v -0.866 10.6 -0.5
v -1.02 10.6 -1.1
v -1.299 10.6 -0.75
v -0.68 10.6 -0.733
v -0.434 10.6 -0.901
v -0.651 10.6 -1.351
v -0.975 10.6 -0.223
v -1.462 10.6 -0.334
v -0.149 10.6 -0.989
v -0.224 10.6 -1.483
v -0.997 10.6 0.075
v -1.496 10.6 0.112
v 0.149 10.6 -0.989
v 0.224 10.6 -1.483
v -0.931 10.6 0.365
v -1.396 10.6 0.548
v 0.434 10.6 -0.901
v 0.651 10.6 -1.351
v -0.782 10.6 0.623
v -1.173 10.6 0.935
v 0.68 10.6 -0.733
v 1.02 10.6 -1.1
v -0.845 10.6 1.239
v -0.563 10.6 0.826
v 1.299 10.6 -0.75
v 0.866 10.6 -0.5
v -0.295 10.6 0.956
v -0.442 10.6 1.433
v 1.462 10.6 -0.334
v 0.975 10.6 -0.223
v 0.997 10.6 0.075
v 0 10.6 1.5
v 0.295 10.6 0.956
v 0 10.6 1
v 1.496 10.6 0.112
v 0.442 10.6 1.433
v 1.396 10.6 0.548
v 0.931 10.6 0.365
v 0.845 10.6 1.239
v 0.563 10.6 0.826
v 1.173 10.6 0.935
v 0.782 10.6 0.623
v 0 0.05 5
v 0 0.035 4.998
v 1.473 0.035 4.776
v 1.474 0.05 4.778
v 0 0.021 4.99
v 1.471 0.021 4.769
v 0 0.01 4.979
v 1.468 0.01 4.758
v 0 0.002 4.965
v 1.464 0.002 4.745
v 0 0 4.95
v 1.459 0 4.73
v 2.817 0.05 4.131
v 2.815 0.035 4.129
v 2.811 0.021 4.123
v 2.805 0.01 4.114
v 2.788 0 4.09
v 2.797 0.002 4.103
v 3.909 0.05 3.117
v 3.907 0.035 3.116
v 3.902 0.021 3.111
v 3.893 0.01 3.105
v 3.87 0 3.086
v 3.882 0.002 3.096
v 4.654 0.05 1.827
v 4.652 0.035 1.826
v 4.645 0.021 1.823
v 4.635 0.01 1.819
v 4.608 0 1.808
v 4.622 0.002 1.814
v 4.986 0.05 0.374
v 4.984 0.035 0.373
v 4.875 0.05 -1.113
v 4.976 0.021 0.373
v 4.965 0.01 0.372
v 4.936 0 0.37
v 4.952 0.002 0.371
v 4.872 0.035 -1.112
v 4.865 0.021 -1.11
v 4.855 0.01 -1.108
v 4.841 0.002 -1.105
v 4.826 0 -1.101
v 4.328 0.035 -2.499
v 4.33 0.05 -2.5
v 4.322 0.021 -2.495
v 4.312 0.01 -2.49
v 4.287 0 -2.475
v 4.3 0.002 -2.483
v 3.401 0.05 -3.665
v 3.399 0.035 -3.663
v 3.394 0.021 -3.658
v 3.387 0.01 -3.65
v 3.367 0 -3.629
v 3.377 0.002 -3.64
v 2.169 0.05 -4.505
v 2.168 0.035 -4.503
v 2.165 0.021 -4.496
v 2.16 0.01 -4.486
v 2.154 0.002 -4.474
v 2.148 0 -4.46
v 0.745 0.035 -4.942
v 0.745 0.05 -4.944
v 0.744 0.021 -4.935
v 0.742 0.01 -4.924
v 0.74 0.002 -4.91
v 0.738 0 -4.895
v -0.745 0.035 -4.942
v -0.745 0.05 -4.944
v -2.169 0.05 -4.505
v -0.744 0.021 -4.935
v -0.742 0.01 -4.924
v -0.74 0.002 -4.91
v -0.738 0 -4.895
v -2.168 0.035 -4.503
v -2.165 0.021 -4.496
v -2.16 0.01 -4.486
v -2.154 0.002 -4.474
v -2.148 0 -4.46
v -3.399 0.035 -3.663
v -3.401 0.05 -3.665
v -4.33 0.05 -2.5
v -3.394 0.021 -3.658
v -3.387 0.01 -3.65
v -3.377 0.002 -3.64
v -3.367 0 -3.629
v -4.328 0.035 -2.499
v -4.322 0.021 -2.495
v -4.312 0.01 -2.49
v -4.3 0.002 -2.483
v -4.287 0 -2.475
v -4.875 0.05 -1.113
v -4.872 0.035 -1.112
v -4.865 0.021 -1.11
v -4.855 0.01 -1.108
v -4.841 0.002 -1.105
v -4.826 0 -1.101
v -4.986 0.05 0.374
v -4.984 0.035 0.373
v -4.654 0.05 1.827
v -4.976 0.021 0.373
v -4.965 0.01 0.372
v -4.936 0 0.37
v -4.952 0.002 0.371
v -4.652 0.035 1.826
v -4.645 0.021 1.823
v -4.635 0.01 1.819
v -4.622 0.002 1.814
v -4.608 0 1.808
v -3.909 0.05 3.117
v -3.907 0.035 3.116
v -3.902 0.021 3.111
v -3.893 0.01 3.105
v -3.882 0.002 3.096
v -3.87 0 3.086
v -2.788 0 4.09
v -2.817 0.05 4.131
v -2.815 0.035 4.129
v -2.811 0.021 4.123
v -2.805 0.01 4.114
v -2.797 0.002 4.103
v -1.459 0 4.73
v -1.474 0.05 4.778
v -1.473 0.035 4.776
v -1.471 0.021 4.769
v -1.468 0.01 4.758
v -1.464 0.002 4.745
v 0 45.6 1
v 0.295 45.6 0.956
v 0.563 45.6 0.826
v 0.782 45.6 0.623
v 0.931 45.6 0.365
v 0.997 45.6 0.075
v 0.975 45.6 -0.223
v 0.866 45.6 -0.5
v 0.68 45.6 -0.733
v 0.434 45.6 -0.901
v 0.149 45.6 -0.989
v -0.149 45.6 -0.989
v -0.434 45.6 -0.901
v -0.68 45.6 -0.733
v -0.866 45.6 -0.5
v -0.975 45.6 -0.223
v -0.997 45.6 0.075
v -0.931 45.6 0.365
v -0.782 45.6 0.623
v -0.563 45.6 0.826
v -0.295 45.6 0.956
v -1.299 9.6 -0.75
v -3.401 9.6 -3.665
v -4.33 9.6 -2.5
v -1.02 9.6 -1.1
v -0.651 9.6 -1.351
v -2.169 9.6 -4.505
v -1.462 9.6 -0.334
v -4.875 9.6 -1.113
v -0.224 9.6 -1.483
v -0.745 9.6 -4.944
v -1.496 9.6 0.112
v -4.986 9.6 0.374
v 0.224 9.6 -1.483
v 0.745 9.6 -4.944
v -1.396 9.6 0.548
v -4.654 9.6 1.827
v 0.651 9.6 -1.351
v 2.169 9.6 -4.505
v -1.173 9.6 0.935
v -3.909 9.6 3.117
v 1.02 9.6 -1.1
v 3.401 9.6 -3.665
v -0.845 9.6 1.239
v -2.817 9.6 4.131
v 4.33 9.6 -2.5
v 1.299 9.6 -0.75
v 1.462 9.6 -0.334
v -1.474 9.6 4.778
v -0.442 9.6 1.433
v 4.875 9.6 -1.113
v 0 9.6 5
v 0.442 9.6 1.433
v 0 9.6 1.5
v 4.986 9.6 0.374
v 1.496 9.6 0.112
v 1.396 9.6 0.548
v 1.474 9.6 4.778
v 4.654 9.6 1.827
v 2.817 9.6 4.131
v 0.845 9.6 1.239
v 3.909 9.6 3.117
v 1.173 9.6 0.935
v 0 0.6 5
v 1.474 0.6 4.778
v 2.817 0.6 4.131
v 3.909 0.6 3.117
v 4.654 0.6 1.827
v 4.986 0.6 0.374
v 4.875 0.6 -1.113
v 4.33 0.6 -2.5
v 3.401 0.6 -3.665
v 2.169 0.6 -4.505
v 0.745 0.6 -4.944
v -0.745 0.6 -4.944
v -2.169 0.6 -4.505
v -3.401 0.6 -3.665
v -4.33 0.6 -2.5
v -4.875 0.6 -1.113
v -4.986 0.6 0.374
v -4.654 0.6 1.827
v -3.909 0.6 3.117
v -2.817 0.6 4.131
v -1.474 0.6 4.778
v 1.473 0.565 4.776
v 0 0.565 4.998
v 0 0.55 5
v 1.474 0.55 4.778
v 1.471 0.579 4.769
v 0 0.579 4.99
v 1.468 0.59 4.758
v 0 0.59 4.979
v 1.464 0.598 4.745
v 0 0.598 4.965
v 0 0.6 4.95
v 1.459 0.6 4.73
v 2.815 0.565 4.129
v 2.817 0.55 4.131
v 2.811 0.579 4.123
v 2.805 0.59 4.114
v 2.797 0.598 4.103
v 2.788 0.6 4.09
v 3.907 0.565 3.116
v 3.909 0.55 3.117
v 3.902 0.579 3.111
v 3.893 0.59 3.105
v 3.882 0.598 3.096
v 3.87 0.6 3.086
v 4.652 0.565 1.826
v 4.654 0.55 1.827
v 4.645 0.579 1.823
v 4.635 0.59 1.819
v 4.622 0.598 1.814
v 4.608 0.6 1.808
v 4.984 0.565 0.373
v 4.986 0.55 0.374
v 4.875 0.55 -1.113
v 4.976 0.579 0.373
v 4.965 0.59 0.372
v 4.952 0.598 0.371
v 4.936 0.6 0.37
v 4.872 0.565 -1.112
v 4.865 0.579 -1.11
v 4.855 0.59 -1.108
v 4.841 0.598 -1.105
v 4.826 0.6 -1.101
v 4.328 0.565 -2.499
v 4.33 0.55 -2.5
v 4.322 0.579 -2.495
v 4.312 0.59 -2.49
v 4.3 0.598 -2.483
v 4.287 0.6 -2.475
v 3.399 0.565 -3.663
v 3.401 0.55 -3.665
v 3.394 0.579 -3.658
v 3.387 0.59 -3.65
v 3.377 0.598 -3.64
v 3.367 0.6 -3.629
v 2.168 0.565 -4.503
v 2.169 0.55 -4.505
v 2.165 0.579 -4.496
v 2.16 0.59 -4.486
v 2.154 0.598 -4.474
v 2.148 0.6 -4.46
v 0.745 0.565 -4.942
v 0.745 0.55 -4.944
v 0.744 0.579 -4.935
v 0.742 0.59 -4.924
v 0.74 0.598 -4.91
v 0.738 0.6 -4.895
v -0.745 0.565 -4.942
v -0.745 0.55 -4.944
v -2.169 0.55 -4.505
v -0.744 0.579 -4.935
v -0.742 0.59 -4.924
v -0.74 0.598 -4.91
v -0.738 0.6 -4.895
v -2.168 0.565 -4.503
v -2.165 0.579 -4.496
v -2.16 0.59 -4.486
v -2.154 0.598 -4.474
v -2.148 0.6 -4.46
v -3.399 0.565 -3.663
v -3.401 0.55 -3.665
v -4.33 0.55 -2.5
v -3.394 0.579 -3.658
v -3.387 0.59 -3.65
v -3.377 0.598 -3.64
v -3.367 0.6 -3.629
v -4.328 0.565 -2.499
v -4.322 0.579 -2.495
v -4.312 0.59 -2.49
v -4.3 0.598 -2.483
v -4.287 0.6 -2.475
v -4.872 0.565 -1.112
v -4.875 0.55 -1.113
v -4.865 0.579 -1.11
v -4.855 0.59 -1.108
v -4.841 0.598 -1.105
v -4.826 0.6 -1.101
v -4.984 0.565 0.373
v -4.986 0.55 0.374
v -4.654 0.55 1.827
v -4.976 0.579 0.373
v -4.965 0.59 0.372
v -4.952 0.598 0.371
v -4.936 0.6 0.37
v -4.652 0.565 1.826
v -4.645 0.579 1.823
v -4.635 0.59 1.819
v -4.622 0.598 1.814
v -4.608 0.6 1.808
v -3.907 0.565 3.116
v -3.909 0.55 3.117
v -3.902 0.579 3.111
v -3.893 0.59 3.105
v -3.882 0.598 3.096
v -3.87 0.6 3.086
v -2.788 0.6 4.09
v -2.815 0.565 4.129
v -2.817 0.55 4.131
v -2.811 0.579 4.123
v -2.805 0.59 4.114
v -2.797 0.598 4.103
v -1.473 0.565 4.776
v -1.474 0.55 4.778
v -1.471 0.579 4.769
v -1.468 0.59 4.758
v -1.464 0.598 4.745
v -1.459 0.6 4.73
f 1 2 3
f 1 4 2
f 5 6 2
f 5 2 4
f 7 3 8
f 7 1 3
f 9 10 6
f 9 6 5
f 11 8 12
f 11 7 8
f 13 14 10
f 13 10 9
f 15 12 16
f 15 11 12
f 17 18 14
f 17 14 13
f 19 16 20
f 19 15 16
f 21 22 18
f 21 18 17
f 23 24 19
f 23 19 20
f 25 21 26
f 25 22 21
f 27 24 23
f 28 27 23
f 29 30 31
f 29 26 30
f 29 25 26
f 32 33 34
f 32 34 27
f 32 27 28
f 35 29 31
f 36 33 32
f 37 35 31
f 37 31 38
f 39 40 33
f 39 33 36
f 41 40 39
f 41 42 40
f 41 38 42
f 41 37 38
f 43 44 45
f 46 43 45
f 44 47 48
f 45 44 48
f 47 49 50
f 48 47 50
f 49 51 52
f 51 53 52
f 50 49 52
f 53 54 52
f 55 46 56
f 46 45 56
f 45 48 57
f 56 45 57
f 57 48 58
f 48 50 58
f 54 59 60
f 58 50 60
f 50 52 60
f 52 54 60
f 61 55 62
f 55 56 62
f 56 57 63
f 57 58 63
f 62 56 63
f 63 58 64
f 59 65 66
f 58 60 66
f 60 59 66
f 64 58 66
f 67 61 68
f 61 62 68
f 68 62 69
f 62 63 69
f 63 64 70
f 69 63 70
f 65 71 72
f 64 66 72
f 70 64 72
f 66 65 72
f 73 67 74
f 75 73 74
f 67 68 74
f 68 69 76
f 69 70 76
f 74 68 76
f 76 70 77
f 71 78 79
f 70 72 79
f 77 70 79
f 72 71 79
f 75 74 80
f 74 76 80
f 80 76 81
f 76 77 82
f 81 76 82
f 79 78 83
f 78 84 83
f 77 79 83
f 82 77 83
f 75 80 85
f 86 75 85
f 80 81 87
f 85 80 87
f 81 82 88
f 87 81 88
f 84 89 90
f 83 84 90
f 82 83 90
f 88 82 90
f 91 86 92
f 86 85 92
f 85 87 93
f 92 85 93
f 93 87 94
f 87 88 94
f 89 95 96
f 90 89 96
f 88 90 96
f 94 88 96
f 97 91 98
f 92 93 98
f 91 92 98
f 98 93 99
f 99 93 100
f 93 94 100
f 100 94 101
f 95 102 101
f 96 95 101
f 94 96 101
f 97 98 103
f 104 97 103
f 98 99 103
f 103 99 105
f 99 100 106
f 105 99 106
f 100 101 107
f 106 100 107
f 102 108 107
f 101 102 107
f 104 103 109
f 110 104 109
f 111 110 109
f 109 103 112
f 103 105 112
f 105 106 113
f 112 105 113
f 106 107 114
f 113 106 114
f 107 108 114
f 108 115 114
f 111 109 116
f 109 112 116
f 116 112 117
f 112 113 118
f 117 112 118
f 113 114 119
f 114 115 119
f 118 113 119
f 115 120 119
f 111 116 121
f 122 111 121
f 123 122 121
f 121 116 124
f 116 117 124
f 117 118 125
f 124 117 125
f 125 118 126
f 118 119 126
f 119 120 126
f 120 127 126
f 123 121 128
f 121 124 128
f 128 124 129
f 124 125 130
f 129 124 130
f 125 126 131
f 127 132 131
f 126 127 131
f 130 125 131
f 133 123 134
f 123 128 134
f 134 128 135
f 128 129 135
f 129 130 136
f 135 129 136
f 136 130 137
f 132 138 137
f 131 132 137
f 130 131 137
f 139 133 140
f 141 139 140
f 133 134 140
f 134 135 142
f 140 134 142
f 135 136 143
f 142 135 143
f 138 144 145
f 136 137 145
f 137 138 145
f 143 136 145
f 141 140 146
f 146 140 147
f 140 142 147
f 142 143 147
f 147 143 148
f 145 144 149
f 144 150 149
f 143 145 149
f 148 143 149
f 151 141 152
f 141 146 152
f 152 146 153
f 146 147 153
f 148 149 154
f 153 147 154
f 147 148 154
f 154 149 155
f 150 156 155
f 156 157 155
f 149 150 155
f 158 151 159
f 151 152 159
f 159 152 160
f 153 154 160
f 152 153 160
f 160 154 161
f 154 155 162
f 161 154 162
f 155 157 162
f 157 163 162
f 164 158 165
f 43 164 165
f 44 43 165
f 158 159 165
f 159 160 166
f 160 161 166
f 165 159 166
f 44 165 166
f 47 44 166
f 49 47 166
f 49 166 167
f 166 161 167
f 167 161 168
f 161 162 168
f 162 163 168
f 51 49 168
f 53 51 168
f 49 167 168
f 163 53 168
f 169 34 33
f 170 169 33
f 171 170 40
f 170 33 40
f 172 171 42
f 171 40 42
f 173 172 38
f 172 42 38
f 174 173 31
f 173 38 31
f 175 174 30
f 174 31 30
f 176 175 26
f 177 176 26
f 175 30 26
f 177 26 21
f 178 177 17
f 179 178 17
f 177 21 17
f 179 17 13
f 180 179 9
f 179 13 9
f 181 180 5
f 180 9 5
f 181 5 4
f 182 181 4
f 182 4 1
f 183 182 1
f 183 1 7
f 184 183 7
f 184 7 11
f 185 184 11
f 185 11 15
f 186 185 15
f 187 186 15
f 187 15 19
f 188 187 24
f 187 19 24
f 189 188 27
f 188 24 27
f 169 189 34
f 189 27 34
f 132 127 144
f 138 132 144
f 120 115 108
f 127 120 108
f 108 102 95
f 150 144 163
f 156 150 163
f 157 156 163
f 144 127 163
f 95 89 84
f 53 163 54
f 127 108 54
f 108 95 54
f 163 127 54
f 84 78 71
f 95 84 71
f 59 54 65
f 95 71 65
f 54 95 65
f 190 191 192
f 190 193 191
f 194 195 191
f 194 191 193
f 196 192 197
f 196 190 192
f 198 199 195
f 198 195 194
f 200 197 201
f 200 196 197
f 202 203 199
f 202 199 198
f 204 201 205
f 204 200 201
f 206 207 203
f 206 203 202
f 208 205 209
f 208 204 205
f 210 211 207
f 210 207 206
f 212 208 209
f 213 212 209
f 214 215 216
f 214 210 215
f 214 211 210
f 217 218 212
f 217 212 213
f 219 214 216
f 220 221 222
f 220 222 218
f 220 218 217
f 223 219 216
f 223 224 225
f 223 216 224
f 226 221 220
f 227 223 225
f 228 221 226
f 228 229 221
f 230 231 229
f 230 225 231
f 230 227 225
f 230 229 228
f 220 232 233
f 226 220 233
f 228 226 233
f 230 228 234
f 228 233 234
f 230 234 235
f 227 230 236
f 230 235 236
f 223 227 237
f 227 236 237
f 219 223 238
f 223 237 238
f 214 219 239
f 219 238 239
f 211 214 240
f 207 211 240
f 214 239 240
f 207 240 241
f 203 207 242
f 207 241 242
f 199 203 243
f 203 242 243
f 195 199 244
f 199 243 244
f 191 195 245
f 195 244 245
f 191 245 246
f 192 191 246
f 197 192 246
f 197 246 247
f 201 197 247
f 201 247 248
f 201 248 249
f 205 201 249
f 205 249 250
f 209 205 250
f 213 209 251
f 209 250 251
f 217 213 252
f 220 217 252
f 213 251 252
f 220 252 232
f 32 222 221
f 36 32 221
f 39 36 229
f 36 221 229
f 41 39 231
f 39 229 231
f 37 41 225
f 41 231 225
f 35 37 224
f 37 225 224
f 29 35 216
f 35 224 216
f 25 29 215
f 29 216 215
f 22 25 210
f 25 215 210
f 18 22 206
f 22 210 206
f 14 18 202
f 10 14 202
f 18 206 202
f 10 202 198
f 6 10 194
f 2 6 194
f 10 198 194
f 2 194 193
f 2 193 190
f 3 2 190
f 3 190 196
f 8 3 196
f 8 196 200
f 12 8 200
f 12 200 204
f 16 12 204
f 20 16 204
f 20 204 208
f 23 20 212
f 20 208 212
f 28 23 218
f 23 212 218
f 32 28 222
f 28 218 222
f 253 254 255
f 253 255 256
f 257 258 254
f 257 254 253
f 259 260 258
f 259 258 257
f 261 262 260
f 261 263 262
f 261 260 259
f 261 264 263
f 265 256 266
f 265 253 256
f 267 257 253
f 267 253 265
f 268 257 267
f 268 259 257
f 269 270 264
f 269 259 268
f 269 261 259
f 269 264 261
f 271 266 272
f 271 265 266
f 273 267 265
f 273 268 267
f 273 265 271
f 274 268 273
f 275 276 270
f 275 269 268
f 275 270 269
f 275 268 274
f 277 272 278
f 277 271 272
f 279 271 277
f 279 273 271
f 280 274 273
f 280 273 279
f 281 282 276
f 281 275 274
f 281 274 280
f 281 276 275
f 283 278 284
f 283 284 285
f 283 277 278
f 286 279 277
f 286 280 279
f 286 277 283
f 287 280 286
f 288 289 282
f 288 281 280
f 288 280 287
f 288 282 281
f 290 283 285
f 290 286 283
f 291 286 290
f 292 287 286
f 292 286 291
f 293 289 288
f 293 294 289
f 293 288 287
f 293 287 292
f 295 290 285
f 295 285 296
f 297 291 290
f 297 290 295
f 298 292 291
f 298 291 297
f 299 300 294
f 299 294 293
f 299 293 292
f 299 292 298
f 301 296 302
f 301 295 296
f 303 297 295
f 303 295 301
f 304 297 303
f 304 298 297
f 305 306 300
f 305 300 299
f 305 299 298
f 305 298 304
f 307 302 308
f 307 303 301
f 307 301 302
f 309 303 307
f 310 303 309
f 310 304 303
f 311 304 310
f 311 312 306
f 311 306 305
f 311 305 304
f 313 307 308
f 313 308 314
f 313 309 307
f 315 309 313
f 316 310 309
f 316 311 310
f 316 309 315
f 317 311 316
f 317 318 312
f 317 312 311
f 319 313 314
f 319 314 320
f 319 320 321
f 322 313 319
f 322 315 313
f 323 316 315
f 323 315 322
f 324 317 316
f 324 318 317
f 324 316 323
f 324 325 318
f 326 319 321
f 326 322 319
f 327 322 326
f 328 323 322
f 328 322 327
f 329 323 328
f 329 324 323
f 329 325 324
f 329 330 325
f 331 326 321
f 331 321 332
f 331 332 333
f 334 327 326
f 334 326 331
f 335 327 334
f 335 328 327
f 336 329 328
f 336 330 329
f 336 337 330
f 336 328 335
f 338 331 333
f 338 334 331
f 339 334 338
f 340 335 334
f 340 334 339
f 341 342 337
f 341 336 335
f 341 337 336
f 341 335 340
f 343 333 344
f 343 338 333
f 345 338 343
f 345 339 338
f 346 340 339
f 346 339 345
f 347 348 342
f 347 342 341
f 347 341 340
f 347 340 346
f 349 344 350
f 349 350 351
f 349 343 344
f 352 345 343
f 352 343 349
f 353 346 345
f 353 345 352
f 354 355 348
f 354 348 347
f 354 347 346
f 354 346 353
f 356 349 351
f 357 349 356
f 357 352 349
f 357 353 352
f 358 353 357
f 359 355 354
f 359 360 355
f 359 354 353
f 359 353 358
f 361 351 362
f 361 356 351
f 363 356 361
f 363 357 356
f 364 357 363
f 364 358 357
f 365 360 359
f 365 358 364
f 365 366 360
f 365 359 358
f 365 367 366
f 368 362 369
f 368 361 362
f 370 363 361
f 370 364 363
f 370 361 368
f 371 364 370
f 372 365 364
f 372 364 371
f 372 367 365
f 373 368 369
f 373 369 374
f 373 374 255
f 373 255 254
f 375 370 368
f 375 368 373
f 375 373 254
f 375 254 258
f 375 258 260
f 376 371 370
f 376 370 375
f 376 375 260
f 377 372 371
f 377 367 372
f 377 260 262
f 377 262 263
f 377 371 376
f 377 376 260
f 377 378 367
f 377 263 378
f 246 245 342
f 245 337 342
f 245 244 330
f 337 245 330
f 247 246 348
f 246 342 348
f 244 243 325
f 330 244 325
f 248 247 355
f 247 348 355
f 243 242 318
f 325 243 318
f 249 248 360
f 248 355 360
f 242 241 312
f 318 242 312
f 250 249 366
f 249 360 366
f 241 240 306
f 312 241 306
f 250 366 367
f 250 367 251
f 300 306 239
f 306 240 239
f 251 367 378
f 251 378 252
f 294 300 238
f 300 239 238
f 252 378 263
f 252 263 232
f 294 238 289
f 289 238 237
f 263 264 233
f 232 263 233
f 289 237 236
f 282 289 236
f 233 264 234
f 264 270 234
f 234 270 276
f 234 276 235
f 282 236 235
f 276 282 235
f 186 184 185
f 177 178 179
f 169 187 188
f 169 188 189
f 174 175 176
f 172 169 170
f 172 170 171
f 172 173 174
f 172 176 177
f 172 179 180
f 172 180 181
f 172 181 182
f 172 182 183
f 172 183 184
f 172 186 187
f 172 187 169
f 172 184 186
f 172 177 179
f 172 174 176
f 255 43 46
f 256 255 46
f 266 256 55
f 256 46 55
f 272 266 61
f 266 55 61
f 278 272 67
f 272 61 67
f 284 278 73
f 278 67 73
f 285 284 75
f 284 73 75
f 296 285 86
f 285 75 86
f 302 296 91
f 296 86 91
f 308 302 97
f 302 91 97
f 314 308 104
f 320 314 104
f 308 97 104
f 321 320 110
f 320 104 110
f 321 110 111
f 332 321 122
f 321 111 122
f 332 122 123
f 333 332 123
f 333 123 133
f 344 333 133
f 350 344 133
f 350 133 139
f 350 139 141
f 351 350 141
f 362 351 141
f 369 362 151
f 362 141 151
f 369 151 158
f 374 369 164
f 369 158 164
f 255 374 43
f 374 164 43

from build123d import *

# Parameters (mm, degrees)
SKETCH_1_R      = 5
EXTRUDE_1_DEPTH = 0.6
FILLET_1_R      = 0.05
FILLET_2_R      = 0.05
SKETCH_2_R      = 5
EXTRUDE_2_DEPTH = 9
SKETCH_3_R      = 1.5
EXTRUDE_3_DEPTH = 1
SKETCH_4_R      = 1
EXTRUDE_4_DEPTH = 35


with BuildPart() as part:
    # 草图1 → 凸台-拉伸1 (new body)
    with BuildSketch(Plane(origin=(0, 0, 0), x_dir=(1, 0, 0), z_dir=(0, 1, 0))):
        Circle(SKETCH_1_R)
    extrude(amount=EXTRUDE_1_DEPTH)

    # 圆角1
    fillet_1_edges = [part.edges().sort_by_distance(p)[0] for p in [
        (-5, 0.6, 0),
    ]]
    fillet(fillet_1_edges, radius=FILLET_1_R)

    # 圆角2
    fillet_2_edges = [part.edges().sort_by_distance(p)[0] for p in [
        (-5, 0, 0),
    ]]
    fillet(fillet_2_edges, radius=FILLET_2_R)

    # 草图2 → 凸台-拉伸2 (add)
    with BuildSketch(Plane(origin=(0, 0.6, 0), x_dir=(1, 0, 0), z_dir=(0, 1, 0))):
        Circle(SKETCH_2_R)
    extrude(amount=EXTRUDE_2_DEPTH)

    # 草图3 → 凸台-拉伸3 (add)
    with BuildSketch(Plane(origin=(0, 9.6, 0), x_dir=(1, 0, 0), z_dir=(0, 1, 0))):
        Circle(SKETCH_3_R)
    extrude(amount=EXTRUDE_3_DEPTH)

    # 草图4 → 凸台-拉伸4 (add)
    with BuildSketch(Plane(origin=(0, 10.6, 0), x_dir=(1, 0, 0), z_dir=(0, 1, 0))):
        Circle(SKETCH_4_R)
    extrude(amount=EXTRUDE_4_DEPTH)


solid = part.part
